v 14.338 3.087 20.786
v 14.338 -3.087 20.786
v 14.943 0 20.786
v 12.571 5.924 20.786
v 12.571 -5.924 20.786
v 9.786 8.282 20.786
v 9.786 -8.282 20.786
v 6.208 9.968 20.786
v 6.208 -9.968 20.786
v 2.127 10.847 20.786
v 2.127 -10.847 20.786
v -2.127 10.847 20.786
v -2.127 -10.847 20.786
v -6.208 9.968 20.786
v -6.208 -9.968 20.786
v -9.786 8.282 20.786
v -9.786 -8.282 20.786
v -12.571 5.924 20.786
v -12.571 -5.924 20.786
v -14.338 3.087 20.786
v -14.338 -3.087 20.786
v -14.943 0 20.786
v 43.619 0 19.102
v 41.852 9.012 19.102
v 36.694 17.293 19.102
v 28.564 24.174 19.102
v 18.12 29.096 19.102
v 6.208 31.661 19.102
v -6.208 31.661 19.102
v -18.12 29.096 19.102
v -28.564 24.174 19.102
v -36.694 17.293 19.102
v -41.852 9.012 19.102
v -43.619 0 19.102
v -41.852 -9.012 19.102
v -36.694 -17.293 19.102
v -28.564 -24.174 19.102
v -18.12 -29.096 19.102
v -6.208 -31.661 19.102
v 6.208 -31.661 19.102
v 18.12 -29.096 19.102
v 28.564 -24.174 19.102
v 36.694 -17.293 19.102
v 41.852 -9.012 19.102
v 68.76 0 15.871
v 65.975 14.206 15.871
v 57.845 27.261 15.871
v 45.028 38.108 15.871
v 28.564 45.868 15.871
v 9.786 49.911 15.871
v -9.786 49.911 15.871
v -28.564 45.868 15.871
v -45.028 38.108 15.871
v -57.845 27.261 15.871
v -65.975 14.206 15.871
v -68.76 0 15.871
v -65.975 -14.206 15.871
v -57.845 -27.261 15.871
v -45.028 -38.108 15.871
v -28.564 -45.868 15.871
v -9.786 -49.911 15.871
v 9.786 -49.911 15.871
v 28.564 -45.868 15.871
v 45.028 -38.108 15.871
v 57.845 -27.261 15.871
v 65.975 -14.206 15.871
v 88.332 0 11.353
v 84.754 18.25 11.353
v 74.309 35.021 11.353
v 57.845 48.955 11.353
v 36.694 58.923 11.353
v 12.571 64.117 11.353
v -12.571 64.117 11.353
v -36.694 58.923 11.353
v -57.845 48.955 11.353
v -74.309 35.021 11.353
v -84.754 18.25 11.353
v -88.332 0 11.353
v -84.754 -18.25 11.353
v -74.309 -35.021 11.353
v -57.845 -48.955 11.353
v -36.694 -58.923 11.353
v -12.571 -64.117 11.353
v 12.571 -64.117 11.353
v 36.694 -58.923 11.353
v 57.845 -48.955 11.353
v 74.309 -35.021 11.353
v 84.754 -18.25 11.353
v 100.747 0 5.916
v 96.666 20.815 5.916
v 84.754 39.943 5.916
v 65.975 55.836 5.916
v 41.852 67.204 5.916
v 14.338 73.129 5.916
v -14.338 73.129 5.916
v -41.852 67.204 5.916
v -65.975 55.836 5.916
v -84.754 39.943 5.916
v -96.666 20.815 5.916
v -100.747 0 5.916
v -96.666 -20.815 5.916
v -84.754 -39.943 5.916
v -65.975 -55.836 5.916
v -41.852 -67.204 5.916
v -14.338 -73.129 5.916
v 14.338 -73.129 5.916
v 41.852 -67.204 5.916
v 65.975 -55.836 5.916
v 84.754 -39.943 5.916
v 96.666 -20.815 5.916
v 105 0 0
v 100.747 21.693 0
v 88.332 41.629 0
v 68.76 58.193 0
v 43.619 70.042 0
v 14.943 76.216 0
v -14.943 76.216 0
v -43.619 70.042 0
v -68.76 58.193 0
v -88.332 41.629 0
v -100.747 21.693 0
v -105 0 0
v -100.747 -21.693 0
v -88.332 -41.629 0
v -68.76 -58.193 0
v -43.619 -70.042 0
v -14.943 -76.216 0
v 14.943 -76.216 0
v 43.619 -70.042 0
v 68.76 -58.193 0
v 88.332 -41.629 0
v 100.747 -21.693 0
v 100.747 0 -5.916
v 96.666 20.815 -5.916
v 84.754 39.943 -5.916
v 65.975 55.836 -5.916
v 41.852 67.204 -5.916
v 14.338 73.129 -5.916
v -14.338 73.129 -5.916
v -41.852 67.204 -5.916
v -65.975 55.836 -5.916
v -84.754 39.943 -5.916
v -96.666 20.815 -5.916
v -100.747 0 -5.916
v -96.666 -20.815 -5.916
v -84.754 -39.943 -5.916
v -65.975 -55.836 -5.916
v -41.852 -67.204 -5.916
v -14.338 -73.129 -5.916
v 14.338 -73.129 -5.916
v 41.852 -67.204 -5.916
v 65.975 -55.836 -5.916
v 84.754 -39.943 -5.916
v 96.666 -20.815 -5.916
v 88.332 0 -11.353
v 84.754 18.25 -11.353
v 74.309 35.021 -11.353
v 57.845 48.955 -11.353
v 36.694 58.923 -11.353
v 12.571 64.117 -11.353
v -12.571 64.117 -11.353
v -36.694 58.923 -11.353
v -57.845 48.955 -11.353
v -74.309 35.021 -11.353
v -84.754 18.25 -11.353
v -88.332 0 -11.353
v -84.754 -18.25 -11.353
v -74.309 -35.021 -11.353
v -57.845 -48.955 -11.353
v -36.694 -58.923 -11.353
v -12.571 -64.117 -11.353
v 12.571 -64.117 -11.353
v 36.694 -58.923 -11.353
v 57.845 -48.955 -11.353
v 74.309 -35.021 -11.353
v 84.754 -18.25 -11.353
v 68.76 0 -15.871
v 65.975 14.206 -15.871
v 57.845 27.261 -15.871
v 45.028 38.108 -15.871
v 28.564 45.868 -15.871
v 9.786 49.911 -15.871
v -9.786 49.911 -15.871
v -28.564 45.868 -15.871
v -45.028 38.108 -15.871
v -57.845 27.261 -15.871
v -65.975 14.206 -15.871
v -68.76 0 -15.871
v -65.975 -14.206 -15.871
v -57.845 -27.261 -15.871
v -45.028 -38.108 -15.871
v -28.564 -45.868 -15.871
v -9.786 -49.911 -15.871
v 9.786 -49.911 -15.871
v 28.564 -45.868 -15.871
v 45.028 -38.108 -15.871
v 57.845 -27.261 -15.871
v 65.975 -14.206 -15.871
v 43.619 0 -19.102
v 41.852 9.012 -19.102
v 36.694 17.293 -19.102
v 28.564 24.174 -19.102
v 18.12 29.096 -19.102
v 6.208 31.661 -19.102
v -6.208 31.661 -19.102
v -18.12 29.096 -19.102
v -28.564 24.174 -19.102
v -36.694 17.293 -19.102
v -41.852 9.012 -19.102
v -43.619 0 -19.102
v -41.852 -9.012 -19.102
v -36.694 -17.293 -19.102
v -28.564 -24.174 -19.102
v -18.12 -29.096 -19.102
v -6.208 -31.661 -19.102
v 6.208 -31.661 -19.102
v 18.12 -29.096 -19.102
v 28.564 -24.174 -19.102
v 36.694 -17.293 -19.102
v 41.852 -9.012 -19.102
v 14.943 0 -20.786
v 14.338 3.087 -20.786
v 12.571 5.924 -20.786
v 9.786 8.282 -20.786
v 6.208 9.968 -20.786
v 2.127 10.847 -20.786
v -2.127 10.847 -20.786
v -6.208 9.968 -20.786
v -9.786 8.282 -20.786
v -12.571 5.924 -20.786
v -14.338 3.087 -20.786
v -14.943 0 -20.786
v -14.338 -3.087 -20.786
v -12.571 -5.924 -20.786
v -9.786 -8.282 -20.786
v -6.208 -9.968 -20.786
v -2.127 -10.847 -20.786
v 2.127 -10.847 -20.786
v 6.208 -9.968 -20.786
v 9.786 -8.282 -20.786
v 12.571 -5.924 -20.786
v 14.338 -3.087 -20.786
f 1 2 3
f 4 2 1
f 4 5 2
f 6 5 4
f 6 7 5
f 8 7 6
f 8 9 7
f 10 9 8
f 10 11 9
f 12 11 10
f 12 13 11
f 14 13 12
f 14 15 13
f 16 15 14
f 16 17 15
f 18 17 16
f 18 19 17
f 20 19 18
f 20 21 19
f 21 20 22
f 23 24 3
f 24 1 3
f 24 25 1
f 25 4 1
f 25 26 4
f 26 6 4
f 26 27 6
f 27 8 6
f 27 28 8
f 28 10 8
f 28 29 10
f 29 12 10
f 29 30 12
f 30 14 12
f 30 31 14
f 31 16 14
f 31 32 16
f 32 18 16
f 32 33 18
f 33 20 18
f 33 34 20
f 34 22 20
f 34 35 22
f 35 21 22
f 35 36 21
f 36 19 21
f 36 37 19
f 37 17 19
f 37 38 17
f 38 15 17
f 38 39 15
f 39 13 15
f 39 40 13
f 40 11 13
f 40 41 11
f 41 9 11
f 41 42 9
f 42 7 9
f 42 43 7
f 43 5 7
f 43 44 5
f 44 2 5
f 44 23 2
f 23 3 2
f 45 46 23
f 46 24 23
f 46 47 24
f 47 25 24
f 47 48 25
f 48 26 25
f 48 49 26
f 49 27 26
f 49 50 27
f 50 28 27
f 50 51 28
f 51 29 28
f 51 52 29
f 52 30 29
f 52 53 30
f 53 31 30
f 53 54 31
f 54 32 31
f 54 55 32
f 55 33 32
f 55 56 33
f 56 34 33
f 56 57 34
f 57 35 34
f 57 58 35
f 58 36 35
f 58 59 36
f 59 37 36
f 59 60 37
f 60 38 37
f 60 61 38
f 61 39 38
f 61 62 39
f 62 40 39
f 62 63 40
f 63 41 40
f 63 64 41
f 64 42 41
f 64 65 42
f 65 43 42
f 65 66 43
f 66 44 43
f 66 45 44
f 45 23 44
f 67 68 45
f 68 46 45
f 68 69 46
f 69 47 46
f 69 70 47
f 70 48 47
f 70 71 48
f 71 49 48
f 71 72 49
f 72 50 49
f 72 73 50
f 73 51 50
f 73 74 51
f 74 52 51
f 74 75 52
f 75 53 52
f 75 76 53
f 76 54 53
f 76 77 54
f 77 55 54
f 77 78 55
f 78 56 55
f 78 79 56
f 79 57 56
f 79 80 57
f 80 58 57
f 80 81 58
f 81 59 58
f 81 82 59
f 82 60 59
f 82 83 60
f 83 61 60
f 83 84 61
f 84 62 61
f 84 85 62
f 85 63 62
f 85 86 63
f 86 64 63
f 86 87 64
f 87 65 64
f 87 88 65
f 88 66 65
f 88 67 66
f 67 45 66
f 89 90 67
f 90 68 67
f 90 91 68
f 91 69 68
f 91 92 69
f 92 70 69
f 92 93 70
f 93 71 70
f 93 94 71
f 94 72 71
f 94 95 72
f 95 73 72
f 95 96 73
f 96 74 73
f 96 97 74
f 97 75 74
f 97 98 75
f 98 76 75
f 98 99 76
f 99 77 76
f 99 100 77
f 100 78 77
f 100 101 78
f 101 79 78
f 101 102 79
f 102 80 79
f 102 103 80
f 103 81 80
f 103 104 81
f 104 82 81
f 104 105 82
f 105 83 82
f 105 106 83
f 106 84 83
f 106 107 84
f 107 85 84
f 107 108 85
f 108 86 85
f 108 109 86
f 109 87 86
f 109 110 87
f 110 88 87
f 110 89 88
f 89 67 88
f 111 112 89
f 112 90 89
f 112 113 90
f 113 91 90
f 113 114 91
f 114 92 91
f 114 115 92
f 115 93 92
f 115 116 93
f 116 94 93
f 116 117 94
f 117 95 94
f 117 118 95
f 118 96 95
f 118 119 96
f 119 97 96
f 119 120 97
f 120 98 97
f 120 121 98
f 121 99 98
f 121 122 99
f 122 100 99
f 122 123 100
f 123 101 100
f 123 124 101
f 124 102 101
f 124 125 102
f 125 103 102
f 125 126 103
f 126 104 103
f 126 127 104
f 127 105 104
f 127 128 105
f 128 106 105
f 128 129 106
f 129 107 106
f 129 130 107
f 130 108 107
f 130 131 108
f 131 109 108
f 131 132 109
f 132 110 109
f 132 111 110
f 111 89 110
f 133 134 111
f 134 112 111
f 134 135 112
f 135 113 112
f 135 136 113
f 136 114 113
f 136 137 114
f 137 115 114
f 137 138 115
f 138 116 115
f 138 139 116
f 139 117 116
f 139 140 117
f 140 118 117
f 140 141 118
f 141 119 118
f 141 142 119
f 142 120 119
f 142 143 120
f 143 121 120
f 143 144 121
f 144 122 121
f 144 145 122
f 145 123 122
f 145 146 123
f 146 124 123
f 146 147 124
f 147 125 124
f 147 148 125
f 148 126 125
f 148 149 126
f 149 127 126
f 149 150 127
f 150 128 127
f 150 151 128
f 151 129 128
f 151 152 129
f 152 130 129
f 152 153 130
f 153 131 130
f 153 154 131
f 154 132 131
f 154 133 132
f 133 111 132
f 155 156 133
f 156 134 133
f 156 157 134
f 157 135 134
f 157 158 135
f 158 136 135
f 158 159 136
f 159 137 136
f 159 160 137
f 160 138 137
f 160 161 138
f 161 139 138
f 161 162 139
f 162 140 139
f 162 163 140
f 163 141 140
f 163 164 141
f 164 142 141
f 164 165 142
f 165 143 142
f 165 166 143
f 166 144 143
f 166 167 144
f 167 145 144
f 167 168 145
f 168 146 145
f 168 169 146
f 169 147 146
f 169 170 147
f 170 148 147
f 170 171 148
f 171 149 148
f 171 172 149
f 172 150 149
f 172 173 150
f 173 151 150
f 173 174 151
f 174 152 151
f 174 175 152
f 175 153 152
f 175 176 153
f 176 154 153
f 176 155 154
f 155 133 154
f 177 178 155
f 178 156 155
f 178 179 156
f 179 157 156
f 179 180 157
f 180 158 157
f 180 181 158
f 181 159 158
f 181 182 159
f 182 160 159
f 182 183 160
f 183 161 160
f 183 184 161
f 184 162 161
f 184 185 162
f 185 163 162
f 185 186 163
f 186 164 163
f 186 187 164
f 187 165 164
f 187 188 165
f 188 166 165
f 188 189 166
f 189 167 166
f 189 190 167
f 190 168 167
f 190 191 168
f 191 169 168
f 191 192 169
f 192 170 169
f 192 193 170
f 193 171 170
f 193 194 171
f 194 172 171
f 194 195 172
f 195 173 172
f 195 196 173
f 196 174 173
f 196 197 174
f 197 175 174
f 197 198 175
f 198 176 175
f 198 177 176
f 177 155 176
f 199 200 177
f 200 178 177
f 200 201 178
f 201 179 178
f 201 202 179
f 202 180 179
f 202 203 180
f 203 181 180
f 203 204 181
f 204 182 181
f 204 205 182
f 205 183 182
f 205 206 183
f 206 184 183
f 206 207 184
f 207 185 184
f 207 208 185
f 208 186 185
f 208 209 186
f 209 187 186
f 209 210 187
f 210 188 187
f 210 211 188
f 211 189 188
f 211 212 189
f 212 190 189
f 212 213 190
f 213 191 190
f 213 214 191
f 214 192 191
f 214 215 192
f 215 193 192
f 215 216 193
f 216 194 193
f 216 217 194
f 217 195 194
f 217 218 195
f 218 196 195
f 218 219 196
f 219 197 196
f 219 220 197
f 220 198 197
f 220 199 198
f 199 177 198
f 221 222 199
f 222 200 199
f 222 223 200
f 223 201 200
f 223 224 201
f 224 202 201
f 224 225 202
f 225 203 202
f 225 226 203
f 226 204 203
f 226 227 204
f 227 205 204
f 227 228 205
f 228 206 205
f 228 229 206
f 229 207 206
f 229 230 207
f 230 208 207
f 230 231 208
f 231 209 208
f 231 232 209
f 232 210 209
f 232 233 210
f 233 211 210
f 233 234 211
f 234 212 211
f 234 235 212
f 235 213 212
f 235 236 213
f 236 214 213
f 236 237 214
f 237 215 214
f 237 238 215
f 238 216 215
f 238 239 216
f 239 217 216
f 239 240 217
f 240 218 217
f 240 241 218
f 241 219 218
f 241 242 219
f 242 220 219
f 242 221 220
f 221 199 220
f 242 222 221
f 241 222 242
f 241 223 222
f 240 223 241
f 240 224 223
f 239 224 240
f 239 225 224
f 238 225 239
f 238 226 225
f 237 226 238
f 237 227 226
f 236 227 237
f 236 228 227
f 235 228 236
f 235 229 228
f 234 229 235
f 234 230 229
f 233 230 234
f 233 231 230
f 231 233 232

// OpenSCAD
// Generated by SolidPython 1.0.1 on 2020-07-29 00:46:52


scale(v = [15, 11, 3]) {
	sphere(r = 7);
}
/***********************************************
*********      SolidPython code:      **********
************************************************
 
# import packages: SolidPython
from solid import *
from solid.utils import *
from itertools import chain, combinations, permutations


class Resize:

    def __init__(self, scad_file):
        self.scad_file = scad_file
        #self.scad_file = import_scad(scad_file)
        # cone/cylinder param:
        self.r1 = 0
        self.r2 = 0
        self.h = 0
        # rectangular prism param:
        self.w = 0
        self.l = 0
        # ellipse param:
        self.r = 0

    # import OpenScad code (file name corresponds to shape)


    # classify shape + parameters
    def assign(self, param1, param2, param3):
        if self.scad_file == 'cone.scad':
            self.r1 = param1
            self.r2 = param2
            self.h = param3
        elif self.scad_file == 'cylinder.scad':
            self.r1 = param1
            self.r2 = param2
            self.h = param3
        elif self.scad_file == 'rectangularPrism.scad':
            self.h = param1
            self.l = param2
            self.w = param3
        else:
            self.r = param1
            self.h = param2

    # resize parameters
    def iterate(self):
        x = range(3, 20, 2)
        i = 1
        if self.scad_file == 'cone.scad':
            tempList = list(permutations(x, 2))
            for temp in tempList:
                param1 = temp[0]
                param2 = temp[1]
                filepath = 'produced_scad_files/' + 'cone' + str(param1) + '_' + str(param2) + '_' + '.scad'
                scad_render_to_file(cylinder(h=param1, r1=param2, r2=0), filepath)

        elif self.scad_file == 'cylinder.scad':
            tempList = list(permutations(x, 3))
            for temp in tempList:
                param1 = temp[0]
                param2 = temp[1]
                filepath = 'produced_scad_files/' + 'cylinder' + str(param1) + '_' + str(param2) + '_' + '.scad'
                scad_render_to_file(cylinder(h=param1, r1=param2, r2=param2), filepath)

        elif self.scad_file == 'rectangularPrism.scad':
            tempList = list(permutations(x, 3))
            for temp in tempList:
                param1 = temp[0]
                param2 = temp[1]
                param3 = temp[2]
                filepath = 'produced_scad_files/' + 'rectangularPrism' + str(param1) + '_' + str(param2) + '_' + str(
                    param3) + '.scad'
                scad_render_to_file(cube(size=(param1, param2, param3)), filepath)

        elif self.scad_file == 'ellipse.scad':
            tempList = list(permutations(x, 4))
            for temp in tempList:
                param1 = temp[0]
                param2 = temp[1]
                param3 = temp[2]
                param4 = temp[3]
                filepath = 'produced_scad_files/' + 'ellipse' + str(param1) + '_' + str(param2) + '_' + str(param3) + '_' + str(param4) + '.scad'
                scad_render_to_file(scale([param1, param2, param3])(sphere(r=param4)), filepath)

    def render_to_scadfile(self):
        scad_render_to_file(scad, 'example.scad') 
 
************************************************/
